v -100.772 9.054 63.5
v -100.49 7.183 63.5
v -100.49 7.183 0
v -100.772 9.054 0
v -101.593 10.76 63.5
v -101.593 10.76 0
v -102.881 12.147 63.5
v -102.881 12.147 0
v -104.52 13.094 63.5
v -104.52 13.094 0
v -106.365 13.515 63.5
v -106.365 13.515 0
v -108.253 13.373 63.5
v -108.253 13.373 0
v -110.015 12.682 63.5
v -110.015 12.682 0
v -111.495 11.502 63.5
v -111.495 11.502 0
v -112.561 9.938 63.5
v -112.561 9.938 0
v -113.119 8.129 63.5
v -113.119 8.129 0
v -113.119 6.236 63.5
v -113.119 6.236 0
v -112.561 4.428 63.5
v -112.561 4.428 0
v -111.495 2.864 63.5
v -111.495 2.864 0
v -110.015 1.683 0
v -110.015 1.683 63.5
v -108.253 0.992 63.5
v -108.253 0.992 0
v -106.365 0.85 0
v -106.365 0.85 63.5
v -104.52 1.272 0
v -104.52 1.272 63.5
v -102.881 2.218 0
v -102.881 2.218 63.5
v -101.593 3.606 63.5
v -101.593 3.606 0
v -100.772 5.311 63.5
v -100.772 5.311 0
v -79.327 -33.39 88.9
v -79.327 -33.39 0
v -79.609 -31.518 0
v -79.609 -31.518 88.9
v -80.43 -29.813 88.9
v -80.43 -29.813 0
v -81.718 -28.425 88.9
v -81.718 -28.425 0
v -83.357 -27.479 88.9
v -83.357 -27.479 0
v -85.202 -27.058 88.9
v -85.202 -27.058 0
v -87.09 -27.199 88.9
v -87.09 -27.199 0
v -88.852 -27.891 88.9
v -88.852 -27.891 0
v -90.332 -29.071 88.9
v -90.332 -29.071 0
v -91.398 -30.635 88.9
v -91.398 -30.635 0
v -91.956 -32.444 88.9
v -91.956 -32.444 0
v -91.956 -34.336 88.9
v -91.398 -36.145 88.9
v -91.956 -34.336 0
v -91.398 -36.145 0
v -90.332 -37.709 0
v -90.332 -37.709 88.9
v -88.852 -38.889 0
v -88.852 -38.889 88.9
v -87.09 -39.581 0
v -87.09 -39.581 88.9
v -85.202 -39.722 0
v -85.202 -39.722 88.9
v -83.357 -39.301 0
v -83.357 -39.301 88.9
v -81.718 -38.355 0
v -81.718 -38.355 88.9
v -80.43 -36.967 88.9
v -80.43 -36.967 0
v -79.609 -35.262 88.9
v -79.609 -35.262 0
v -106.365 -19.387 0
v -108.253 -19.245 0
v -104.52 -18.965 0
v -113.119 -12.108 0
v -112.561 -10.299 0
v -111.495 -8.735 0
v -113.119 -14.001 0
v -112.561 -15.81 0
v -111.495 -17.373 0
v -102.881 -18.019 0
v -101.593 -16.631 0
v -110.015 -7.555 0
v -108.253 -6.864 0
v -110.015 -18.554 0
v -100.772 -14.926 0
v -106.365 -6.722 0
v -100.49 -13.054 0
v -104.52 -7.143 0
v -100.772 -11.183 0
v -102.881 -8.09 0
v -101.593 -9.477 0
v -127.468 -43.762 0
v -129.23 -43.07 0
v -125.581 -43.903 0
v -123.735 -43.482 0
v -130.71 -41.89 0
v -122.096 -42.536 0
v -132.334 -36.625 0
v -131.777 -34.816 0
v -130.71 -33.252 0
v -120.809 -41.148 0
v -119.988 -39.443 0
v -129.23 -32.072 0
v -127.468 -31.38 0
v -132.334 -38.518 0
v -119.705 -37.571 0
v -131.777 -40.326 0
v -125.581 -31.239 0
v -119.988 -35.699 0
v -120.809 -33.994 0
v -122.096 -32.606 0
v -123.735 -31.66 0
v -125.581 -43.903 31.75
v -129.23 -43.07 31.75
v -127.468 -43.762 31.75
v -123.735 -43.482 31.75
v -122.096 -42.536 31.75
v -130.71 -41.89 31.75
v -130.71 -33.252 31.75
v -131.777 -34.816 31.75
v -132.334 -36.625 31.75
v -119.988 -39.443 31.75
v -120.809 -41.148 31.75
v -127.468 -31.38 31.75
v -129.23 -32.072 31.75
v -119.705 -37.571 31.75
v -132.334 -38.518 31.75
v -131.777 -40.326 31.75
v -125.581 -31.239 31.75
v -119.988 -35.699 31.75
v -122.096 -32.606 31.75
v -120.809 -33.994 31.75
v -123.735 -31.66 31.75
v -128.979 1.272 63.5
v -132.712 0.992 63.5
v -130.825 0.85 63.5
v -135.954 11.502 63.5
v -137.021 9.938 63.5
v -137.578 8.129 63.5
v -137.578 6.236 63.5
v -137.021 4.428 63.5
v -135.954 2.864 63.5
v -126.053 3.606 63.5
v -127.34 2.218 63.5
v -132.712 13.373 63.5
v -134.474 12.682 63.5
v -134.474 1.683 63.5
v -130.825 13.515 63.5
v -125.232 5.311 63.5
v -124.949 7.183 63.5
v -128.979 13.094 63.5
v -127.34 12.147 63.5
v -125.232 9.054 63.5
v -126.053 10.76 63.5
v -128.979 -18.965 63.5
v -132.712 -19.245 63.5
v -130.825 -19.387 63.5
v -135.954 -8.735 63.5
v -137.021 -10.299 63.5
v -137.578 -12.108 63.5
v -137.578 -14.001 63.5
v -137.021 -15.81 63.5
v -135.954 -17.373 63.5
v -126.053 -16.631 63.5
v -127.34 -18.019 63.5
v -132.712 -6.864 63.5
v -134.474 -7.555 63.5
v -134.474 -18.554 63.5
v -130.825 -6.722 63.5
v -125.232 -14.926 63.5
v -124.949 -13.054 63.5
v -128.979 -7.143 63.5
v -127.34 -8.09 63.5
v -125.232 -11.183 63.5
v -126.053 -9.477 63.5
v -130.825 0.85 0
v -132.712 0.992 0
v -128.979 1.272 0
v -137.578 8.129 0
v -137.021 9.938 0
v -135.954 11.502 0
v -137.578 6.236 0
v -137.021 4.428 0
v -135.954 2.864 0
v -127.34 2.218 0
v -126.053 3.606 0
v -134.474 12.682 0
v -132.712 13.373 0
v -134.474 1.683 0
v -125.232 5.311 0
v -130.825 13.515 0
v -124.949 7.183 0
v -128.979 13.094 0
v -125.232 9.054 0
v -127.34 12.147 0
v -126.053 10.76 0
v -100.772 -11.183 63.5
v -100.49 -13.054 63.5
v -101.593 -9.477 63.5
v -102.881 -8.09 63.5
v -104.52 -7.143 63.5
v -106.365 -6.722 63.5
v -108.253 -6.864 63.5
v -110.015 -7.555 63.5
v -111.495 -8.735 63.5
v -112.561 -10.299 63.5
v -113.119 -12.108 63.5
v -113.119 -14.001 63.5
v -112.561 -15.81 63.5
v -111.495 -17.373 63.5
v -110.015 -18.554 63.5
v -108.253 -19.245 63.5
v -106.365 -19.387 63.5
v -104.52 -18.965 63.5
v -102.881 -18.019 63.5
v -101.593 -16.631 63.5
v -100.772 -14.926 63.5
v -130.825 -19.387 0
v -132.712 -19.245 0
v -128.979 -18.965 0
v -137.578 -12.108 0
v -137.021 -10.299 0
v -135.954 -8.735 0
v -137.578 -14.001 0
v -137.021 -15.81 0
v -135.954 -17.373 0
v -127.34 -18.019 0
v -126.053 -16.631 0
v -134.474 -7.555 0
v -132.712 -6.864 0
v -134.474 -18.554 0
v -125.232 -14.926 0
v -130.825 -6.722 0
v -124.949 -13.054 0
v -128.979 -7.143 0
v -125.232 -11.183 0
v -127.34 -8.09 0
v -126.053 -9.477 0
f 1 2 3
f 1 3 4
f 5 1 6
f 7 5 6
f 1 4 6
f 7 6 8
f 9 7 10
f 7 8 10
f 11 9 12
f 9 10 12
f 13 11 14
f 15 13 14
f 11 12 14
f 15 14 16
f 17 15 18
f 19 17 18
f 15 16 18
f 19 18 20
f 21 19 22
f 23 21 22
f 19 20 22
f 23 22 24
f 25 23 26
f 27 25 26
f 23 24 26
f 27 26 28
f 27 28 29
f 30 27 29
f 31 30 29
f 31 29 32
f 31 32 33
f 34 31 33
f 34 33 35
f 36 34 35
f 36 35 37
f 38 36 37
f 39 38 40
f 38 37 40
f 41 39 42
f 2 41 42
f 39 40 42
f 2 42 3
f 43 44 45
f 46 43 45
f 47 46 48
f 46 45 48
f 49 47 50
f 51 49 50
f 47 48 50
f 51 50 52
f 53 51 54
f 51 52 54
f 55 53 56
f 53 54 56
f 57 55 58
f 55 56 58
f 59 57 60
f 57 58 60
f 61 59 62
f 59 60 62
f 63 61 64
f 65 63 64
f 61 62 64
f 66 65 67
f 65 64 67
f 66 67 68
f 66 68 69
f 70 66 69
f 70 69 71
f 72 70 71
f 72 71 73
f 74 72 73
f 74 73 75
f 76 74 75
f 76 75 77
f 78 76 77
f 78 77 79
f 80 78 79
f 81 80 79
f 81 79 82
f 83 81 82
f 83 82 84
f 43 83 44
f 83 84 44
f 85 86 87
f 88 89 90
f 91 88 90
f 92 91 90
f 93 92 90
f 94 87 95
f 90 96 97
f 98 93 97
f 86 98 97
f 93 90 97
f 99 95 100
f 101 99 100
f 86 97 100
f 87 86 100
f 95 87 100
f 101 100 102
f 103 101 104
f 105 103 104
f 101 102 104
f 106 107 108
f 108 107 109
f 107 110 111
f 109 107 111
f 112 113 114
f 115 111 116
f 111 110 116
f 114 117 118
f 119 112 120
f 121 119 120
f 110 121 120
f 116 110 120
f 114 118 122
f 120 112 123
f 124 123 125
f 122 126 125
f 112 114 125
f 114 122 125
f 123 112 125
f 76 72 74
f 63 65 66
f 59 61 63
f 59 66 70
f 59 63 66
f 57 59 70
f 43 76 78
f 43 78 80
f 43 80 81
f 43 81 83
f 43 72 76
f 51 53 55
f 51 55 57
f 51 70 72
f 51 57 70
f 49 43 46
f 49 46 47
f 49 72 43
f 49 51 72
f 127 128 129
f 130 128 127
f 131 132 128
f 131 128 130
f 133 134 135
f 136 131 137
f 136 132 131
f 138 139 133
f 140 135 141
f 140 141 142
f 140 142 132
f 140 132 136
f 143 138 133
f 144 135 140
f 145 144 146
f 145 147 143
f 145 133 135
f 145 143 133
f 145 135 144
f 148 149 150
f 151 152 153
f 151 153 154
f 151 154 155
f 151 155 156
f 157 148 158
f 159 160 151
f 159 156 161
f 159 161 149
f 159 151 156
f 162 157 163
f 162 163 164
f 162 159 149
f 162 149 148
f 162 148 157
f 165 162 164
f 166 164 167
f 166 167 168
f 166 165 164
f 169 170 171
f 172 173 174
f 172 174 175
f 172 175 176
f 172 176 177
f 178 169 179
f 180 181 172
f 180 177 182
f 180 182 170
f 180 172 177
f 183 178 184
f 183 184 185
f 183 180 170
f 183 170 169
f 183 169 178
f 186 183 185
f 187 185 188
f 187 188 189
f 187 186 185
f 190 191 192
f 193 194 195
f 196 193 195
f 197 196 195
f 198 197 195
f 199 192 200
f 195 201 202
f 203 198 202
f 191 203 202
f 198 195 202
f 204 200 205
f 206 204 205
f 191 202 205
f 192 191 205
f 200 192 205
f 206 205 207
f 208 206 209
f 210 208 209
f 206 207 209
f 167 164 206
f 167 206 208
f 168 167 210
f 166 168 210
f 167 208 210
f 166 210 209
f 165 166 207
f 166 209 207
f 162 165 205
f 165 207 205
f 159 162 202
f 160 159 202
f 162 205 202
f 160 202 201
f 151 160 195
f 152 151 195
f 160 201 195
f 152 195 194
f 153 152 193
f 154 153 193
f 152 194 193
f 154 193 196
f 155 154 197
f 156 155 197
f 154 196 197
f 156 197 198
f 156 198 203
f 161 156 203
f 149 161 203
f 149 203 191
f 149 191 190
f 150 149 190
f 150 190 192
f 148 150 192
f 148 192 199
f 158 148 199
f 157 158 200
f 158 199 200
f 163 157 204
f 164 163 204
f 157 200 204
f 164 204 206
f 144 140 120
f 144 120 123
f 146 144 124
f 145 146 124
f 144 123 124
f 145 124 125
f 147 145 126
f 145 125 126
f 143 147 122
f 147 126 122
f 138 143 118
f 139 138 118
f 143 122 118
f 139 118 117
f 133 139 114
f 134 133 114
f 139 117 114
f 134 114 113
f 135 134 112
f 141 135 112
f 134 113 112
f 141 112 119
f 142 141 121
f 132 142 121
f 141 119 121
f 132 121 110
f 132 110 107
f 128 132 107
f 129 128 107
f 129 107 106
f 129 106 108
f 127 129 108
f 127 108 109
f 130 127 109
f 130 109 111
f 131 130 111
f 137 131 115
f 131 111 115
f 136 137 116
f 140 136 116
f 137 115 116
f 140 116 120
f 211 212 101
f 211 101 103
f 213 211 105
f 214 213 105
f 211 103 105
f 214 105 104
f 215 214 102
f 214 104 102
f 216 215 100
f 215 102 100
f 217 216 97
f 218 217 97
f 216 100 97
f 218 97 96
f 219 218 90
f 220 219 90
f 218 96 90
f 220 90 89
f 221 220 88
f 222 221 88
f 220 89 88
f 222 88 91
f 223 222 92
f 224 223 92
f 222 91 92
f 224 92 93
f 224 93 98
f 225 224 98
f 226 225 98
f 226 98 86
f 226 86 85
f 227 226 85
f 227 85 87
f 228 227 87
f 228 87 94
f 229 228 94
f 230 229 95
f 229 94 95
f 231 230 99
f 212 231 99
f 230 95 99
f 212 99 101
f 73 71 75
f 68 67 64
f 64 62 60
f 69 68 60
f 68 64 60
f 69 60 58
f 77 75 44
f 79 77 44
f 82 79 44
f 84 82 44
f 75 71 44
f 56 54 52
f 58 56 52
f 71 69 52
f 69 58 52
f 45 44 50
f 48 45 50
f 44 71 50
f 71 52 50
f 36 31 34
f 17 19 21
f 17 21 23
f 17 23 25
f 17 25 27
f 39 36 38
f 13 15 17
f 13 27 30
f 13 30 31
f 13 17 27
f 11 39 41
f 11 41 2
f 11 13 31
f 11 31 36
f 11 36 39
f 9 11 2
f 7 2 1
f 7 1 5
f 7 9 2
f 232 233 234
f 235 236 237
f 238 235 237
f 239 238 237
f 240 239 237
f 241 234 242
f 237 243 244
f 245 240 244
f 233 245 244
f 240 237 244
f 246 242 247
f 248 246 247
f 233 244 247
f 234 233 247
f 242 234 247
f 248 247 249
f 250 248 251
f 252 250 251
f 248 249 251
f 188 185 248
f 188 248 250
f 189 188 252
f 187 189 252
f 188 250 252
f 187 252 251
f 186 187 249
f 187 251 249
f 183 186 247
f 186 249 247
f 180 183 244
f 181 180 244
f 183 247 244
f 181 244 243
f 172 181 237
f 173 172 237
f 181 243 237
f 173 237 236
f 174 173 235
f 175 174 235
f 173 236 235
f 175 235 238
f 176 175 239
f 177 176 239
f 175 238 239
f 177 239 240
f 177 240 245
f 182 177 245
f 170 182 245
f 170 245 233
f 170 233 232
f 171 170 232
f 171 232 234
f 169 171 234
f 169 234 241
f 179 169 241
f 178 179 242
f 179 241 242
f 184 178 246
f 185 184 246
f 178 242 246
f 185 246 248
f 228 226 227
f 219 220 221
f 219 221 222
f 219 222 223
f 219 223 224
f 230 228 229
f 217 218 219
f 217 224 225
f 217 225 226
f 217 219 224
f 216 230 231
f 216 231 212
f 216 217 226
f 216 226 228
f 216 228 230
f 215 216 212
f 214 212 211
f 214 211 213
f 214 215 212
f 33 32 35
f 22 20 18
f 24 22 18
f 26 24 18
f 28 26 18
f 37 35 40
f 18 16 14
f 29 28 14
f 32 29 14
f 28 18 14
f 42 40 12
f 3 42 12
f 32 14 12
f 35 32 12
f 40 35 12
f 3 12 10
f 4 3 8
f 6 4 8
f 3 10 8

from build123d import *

# Parameters (mm, degrees)
F0_R     = 6.35
F1_DEPTH = 63.5
F2_DEPTH = 63.5
F3_DEPTH = 31.75
F4_DEPTH = 88.9


with BuildPart() as f1:
    # F0 (on Top) → F1 (new body)
    with BuildSketch(Plane.XY):
        with Locations((-131.299391, 7.182677)):
            Circle(F0_R)
    extrude(amount=F1_DEPTH)


with BuildPart() as f2:
    # F0 (on Top) → F2 (new body)
    with BuildSketch(Plane.XY):
        with Locations((-106.83988, 7.182677)):
            Circle(F0_R)
        with Locations((-131.299391, -13.054369)):
            Circle(F0_R)
        with Locations((-106.83988, -13.054369)):
            Circle(F0_R)
    extrude(amount=F2_DEPTH)


with BuildPart() as f3:
    # F0 (on Top) → F3 (new body)
    with BuildSketch(Plane.XY):
        with Locations((-126.055405, -37.57111)):
            Circle(F0_R)
    extrude(amount=F3_DEPTH)


with BuildPart() as f4:
    # F0 (on Top) → F4 (new body)
    with BuildSketch(Plane.XY):
        with Locations((-85.676961, -33.389963)):
            Circle(F0_R)
    extrude(amount=F4_DEPTH)


solid = Compound([f1.part, f2.part, f3.part, f4.part])
